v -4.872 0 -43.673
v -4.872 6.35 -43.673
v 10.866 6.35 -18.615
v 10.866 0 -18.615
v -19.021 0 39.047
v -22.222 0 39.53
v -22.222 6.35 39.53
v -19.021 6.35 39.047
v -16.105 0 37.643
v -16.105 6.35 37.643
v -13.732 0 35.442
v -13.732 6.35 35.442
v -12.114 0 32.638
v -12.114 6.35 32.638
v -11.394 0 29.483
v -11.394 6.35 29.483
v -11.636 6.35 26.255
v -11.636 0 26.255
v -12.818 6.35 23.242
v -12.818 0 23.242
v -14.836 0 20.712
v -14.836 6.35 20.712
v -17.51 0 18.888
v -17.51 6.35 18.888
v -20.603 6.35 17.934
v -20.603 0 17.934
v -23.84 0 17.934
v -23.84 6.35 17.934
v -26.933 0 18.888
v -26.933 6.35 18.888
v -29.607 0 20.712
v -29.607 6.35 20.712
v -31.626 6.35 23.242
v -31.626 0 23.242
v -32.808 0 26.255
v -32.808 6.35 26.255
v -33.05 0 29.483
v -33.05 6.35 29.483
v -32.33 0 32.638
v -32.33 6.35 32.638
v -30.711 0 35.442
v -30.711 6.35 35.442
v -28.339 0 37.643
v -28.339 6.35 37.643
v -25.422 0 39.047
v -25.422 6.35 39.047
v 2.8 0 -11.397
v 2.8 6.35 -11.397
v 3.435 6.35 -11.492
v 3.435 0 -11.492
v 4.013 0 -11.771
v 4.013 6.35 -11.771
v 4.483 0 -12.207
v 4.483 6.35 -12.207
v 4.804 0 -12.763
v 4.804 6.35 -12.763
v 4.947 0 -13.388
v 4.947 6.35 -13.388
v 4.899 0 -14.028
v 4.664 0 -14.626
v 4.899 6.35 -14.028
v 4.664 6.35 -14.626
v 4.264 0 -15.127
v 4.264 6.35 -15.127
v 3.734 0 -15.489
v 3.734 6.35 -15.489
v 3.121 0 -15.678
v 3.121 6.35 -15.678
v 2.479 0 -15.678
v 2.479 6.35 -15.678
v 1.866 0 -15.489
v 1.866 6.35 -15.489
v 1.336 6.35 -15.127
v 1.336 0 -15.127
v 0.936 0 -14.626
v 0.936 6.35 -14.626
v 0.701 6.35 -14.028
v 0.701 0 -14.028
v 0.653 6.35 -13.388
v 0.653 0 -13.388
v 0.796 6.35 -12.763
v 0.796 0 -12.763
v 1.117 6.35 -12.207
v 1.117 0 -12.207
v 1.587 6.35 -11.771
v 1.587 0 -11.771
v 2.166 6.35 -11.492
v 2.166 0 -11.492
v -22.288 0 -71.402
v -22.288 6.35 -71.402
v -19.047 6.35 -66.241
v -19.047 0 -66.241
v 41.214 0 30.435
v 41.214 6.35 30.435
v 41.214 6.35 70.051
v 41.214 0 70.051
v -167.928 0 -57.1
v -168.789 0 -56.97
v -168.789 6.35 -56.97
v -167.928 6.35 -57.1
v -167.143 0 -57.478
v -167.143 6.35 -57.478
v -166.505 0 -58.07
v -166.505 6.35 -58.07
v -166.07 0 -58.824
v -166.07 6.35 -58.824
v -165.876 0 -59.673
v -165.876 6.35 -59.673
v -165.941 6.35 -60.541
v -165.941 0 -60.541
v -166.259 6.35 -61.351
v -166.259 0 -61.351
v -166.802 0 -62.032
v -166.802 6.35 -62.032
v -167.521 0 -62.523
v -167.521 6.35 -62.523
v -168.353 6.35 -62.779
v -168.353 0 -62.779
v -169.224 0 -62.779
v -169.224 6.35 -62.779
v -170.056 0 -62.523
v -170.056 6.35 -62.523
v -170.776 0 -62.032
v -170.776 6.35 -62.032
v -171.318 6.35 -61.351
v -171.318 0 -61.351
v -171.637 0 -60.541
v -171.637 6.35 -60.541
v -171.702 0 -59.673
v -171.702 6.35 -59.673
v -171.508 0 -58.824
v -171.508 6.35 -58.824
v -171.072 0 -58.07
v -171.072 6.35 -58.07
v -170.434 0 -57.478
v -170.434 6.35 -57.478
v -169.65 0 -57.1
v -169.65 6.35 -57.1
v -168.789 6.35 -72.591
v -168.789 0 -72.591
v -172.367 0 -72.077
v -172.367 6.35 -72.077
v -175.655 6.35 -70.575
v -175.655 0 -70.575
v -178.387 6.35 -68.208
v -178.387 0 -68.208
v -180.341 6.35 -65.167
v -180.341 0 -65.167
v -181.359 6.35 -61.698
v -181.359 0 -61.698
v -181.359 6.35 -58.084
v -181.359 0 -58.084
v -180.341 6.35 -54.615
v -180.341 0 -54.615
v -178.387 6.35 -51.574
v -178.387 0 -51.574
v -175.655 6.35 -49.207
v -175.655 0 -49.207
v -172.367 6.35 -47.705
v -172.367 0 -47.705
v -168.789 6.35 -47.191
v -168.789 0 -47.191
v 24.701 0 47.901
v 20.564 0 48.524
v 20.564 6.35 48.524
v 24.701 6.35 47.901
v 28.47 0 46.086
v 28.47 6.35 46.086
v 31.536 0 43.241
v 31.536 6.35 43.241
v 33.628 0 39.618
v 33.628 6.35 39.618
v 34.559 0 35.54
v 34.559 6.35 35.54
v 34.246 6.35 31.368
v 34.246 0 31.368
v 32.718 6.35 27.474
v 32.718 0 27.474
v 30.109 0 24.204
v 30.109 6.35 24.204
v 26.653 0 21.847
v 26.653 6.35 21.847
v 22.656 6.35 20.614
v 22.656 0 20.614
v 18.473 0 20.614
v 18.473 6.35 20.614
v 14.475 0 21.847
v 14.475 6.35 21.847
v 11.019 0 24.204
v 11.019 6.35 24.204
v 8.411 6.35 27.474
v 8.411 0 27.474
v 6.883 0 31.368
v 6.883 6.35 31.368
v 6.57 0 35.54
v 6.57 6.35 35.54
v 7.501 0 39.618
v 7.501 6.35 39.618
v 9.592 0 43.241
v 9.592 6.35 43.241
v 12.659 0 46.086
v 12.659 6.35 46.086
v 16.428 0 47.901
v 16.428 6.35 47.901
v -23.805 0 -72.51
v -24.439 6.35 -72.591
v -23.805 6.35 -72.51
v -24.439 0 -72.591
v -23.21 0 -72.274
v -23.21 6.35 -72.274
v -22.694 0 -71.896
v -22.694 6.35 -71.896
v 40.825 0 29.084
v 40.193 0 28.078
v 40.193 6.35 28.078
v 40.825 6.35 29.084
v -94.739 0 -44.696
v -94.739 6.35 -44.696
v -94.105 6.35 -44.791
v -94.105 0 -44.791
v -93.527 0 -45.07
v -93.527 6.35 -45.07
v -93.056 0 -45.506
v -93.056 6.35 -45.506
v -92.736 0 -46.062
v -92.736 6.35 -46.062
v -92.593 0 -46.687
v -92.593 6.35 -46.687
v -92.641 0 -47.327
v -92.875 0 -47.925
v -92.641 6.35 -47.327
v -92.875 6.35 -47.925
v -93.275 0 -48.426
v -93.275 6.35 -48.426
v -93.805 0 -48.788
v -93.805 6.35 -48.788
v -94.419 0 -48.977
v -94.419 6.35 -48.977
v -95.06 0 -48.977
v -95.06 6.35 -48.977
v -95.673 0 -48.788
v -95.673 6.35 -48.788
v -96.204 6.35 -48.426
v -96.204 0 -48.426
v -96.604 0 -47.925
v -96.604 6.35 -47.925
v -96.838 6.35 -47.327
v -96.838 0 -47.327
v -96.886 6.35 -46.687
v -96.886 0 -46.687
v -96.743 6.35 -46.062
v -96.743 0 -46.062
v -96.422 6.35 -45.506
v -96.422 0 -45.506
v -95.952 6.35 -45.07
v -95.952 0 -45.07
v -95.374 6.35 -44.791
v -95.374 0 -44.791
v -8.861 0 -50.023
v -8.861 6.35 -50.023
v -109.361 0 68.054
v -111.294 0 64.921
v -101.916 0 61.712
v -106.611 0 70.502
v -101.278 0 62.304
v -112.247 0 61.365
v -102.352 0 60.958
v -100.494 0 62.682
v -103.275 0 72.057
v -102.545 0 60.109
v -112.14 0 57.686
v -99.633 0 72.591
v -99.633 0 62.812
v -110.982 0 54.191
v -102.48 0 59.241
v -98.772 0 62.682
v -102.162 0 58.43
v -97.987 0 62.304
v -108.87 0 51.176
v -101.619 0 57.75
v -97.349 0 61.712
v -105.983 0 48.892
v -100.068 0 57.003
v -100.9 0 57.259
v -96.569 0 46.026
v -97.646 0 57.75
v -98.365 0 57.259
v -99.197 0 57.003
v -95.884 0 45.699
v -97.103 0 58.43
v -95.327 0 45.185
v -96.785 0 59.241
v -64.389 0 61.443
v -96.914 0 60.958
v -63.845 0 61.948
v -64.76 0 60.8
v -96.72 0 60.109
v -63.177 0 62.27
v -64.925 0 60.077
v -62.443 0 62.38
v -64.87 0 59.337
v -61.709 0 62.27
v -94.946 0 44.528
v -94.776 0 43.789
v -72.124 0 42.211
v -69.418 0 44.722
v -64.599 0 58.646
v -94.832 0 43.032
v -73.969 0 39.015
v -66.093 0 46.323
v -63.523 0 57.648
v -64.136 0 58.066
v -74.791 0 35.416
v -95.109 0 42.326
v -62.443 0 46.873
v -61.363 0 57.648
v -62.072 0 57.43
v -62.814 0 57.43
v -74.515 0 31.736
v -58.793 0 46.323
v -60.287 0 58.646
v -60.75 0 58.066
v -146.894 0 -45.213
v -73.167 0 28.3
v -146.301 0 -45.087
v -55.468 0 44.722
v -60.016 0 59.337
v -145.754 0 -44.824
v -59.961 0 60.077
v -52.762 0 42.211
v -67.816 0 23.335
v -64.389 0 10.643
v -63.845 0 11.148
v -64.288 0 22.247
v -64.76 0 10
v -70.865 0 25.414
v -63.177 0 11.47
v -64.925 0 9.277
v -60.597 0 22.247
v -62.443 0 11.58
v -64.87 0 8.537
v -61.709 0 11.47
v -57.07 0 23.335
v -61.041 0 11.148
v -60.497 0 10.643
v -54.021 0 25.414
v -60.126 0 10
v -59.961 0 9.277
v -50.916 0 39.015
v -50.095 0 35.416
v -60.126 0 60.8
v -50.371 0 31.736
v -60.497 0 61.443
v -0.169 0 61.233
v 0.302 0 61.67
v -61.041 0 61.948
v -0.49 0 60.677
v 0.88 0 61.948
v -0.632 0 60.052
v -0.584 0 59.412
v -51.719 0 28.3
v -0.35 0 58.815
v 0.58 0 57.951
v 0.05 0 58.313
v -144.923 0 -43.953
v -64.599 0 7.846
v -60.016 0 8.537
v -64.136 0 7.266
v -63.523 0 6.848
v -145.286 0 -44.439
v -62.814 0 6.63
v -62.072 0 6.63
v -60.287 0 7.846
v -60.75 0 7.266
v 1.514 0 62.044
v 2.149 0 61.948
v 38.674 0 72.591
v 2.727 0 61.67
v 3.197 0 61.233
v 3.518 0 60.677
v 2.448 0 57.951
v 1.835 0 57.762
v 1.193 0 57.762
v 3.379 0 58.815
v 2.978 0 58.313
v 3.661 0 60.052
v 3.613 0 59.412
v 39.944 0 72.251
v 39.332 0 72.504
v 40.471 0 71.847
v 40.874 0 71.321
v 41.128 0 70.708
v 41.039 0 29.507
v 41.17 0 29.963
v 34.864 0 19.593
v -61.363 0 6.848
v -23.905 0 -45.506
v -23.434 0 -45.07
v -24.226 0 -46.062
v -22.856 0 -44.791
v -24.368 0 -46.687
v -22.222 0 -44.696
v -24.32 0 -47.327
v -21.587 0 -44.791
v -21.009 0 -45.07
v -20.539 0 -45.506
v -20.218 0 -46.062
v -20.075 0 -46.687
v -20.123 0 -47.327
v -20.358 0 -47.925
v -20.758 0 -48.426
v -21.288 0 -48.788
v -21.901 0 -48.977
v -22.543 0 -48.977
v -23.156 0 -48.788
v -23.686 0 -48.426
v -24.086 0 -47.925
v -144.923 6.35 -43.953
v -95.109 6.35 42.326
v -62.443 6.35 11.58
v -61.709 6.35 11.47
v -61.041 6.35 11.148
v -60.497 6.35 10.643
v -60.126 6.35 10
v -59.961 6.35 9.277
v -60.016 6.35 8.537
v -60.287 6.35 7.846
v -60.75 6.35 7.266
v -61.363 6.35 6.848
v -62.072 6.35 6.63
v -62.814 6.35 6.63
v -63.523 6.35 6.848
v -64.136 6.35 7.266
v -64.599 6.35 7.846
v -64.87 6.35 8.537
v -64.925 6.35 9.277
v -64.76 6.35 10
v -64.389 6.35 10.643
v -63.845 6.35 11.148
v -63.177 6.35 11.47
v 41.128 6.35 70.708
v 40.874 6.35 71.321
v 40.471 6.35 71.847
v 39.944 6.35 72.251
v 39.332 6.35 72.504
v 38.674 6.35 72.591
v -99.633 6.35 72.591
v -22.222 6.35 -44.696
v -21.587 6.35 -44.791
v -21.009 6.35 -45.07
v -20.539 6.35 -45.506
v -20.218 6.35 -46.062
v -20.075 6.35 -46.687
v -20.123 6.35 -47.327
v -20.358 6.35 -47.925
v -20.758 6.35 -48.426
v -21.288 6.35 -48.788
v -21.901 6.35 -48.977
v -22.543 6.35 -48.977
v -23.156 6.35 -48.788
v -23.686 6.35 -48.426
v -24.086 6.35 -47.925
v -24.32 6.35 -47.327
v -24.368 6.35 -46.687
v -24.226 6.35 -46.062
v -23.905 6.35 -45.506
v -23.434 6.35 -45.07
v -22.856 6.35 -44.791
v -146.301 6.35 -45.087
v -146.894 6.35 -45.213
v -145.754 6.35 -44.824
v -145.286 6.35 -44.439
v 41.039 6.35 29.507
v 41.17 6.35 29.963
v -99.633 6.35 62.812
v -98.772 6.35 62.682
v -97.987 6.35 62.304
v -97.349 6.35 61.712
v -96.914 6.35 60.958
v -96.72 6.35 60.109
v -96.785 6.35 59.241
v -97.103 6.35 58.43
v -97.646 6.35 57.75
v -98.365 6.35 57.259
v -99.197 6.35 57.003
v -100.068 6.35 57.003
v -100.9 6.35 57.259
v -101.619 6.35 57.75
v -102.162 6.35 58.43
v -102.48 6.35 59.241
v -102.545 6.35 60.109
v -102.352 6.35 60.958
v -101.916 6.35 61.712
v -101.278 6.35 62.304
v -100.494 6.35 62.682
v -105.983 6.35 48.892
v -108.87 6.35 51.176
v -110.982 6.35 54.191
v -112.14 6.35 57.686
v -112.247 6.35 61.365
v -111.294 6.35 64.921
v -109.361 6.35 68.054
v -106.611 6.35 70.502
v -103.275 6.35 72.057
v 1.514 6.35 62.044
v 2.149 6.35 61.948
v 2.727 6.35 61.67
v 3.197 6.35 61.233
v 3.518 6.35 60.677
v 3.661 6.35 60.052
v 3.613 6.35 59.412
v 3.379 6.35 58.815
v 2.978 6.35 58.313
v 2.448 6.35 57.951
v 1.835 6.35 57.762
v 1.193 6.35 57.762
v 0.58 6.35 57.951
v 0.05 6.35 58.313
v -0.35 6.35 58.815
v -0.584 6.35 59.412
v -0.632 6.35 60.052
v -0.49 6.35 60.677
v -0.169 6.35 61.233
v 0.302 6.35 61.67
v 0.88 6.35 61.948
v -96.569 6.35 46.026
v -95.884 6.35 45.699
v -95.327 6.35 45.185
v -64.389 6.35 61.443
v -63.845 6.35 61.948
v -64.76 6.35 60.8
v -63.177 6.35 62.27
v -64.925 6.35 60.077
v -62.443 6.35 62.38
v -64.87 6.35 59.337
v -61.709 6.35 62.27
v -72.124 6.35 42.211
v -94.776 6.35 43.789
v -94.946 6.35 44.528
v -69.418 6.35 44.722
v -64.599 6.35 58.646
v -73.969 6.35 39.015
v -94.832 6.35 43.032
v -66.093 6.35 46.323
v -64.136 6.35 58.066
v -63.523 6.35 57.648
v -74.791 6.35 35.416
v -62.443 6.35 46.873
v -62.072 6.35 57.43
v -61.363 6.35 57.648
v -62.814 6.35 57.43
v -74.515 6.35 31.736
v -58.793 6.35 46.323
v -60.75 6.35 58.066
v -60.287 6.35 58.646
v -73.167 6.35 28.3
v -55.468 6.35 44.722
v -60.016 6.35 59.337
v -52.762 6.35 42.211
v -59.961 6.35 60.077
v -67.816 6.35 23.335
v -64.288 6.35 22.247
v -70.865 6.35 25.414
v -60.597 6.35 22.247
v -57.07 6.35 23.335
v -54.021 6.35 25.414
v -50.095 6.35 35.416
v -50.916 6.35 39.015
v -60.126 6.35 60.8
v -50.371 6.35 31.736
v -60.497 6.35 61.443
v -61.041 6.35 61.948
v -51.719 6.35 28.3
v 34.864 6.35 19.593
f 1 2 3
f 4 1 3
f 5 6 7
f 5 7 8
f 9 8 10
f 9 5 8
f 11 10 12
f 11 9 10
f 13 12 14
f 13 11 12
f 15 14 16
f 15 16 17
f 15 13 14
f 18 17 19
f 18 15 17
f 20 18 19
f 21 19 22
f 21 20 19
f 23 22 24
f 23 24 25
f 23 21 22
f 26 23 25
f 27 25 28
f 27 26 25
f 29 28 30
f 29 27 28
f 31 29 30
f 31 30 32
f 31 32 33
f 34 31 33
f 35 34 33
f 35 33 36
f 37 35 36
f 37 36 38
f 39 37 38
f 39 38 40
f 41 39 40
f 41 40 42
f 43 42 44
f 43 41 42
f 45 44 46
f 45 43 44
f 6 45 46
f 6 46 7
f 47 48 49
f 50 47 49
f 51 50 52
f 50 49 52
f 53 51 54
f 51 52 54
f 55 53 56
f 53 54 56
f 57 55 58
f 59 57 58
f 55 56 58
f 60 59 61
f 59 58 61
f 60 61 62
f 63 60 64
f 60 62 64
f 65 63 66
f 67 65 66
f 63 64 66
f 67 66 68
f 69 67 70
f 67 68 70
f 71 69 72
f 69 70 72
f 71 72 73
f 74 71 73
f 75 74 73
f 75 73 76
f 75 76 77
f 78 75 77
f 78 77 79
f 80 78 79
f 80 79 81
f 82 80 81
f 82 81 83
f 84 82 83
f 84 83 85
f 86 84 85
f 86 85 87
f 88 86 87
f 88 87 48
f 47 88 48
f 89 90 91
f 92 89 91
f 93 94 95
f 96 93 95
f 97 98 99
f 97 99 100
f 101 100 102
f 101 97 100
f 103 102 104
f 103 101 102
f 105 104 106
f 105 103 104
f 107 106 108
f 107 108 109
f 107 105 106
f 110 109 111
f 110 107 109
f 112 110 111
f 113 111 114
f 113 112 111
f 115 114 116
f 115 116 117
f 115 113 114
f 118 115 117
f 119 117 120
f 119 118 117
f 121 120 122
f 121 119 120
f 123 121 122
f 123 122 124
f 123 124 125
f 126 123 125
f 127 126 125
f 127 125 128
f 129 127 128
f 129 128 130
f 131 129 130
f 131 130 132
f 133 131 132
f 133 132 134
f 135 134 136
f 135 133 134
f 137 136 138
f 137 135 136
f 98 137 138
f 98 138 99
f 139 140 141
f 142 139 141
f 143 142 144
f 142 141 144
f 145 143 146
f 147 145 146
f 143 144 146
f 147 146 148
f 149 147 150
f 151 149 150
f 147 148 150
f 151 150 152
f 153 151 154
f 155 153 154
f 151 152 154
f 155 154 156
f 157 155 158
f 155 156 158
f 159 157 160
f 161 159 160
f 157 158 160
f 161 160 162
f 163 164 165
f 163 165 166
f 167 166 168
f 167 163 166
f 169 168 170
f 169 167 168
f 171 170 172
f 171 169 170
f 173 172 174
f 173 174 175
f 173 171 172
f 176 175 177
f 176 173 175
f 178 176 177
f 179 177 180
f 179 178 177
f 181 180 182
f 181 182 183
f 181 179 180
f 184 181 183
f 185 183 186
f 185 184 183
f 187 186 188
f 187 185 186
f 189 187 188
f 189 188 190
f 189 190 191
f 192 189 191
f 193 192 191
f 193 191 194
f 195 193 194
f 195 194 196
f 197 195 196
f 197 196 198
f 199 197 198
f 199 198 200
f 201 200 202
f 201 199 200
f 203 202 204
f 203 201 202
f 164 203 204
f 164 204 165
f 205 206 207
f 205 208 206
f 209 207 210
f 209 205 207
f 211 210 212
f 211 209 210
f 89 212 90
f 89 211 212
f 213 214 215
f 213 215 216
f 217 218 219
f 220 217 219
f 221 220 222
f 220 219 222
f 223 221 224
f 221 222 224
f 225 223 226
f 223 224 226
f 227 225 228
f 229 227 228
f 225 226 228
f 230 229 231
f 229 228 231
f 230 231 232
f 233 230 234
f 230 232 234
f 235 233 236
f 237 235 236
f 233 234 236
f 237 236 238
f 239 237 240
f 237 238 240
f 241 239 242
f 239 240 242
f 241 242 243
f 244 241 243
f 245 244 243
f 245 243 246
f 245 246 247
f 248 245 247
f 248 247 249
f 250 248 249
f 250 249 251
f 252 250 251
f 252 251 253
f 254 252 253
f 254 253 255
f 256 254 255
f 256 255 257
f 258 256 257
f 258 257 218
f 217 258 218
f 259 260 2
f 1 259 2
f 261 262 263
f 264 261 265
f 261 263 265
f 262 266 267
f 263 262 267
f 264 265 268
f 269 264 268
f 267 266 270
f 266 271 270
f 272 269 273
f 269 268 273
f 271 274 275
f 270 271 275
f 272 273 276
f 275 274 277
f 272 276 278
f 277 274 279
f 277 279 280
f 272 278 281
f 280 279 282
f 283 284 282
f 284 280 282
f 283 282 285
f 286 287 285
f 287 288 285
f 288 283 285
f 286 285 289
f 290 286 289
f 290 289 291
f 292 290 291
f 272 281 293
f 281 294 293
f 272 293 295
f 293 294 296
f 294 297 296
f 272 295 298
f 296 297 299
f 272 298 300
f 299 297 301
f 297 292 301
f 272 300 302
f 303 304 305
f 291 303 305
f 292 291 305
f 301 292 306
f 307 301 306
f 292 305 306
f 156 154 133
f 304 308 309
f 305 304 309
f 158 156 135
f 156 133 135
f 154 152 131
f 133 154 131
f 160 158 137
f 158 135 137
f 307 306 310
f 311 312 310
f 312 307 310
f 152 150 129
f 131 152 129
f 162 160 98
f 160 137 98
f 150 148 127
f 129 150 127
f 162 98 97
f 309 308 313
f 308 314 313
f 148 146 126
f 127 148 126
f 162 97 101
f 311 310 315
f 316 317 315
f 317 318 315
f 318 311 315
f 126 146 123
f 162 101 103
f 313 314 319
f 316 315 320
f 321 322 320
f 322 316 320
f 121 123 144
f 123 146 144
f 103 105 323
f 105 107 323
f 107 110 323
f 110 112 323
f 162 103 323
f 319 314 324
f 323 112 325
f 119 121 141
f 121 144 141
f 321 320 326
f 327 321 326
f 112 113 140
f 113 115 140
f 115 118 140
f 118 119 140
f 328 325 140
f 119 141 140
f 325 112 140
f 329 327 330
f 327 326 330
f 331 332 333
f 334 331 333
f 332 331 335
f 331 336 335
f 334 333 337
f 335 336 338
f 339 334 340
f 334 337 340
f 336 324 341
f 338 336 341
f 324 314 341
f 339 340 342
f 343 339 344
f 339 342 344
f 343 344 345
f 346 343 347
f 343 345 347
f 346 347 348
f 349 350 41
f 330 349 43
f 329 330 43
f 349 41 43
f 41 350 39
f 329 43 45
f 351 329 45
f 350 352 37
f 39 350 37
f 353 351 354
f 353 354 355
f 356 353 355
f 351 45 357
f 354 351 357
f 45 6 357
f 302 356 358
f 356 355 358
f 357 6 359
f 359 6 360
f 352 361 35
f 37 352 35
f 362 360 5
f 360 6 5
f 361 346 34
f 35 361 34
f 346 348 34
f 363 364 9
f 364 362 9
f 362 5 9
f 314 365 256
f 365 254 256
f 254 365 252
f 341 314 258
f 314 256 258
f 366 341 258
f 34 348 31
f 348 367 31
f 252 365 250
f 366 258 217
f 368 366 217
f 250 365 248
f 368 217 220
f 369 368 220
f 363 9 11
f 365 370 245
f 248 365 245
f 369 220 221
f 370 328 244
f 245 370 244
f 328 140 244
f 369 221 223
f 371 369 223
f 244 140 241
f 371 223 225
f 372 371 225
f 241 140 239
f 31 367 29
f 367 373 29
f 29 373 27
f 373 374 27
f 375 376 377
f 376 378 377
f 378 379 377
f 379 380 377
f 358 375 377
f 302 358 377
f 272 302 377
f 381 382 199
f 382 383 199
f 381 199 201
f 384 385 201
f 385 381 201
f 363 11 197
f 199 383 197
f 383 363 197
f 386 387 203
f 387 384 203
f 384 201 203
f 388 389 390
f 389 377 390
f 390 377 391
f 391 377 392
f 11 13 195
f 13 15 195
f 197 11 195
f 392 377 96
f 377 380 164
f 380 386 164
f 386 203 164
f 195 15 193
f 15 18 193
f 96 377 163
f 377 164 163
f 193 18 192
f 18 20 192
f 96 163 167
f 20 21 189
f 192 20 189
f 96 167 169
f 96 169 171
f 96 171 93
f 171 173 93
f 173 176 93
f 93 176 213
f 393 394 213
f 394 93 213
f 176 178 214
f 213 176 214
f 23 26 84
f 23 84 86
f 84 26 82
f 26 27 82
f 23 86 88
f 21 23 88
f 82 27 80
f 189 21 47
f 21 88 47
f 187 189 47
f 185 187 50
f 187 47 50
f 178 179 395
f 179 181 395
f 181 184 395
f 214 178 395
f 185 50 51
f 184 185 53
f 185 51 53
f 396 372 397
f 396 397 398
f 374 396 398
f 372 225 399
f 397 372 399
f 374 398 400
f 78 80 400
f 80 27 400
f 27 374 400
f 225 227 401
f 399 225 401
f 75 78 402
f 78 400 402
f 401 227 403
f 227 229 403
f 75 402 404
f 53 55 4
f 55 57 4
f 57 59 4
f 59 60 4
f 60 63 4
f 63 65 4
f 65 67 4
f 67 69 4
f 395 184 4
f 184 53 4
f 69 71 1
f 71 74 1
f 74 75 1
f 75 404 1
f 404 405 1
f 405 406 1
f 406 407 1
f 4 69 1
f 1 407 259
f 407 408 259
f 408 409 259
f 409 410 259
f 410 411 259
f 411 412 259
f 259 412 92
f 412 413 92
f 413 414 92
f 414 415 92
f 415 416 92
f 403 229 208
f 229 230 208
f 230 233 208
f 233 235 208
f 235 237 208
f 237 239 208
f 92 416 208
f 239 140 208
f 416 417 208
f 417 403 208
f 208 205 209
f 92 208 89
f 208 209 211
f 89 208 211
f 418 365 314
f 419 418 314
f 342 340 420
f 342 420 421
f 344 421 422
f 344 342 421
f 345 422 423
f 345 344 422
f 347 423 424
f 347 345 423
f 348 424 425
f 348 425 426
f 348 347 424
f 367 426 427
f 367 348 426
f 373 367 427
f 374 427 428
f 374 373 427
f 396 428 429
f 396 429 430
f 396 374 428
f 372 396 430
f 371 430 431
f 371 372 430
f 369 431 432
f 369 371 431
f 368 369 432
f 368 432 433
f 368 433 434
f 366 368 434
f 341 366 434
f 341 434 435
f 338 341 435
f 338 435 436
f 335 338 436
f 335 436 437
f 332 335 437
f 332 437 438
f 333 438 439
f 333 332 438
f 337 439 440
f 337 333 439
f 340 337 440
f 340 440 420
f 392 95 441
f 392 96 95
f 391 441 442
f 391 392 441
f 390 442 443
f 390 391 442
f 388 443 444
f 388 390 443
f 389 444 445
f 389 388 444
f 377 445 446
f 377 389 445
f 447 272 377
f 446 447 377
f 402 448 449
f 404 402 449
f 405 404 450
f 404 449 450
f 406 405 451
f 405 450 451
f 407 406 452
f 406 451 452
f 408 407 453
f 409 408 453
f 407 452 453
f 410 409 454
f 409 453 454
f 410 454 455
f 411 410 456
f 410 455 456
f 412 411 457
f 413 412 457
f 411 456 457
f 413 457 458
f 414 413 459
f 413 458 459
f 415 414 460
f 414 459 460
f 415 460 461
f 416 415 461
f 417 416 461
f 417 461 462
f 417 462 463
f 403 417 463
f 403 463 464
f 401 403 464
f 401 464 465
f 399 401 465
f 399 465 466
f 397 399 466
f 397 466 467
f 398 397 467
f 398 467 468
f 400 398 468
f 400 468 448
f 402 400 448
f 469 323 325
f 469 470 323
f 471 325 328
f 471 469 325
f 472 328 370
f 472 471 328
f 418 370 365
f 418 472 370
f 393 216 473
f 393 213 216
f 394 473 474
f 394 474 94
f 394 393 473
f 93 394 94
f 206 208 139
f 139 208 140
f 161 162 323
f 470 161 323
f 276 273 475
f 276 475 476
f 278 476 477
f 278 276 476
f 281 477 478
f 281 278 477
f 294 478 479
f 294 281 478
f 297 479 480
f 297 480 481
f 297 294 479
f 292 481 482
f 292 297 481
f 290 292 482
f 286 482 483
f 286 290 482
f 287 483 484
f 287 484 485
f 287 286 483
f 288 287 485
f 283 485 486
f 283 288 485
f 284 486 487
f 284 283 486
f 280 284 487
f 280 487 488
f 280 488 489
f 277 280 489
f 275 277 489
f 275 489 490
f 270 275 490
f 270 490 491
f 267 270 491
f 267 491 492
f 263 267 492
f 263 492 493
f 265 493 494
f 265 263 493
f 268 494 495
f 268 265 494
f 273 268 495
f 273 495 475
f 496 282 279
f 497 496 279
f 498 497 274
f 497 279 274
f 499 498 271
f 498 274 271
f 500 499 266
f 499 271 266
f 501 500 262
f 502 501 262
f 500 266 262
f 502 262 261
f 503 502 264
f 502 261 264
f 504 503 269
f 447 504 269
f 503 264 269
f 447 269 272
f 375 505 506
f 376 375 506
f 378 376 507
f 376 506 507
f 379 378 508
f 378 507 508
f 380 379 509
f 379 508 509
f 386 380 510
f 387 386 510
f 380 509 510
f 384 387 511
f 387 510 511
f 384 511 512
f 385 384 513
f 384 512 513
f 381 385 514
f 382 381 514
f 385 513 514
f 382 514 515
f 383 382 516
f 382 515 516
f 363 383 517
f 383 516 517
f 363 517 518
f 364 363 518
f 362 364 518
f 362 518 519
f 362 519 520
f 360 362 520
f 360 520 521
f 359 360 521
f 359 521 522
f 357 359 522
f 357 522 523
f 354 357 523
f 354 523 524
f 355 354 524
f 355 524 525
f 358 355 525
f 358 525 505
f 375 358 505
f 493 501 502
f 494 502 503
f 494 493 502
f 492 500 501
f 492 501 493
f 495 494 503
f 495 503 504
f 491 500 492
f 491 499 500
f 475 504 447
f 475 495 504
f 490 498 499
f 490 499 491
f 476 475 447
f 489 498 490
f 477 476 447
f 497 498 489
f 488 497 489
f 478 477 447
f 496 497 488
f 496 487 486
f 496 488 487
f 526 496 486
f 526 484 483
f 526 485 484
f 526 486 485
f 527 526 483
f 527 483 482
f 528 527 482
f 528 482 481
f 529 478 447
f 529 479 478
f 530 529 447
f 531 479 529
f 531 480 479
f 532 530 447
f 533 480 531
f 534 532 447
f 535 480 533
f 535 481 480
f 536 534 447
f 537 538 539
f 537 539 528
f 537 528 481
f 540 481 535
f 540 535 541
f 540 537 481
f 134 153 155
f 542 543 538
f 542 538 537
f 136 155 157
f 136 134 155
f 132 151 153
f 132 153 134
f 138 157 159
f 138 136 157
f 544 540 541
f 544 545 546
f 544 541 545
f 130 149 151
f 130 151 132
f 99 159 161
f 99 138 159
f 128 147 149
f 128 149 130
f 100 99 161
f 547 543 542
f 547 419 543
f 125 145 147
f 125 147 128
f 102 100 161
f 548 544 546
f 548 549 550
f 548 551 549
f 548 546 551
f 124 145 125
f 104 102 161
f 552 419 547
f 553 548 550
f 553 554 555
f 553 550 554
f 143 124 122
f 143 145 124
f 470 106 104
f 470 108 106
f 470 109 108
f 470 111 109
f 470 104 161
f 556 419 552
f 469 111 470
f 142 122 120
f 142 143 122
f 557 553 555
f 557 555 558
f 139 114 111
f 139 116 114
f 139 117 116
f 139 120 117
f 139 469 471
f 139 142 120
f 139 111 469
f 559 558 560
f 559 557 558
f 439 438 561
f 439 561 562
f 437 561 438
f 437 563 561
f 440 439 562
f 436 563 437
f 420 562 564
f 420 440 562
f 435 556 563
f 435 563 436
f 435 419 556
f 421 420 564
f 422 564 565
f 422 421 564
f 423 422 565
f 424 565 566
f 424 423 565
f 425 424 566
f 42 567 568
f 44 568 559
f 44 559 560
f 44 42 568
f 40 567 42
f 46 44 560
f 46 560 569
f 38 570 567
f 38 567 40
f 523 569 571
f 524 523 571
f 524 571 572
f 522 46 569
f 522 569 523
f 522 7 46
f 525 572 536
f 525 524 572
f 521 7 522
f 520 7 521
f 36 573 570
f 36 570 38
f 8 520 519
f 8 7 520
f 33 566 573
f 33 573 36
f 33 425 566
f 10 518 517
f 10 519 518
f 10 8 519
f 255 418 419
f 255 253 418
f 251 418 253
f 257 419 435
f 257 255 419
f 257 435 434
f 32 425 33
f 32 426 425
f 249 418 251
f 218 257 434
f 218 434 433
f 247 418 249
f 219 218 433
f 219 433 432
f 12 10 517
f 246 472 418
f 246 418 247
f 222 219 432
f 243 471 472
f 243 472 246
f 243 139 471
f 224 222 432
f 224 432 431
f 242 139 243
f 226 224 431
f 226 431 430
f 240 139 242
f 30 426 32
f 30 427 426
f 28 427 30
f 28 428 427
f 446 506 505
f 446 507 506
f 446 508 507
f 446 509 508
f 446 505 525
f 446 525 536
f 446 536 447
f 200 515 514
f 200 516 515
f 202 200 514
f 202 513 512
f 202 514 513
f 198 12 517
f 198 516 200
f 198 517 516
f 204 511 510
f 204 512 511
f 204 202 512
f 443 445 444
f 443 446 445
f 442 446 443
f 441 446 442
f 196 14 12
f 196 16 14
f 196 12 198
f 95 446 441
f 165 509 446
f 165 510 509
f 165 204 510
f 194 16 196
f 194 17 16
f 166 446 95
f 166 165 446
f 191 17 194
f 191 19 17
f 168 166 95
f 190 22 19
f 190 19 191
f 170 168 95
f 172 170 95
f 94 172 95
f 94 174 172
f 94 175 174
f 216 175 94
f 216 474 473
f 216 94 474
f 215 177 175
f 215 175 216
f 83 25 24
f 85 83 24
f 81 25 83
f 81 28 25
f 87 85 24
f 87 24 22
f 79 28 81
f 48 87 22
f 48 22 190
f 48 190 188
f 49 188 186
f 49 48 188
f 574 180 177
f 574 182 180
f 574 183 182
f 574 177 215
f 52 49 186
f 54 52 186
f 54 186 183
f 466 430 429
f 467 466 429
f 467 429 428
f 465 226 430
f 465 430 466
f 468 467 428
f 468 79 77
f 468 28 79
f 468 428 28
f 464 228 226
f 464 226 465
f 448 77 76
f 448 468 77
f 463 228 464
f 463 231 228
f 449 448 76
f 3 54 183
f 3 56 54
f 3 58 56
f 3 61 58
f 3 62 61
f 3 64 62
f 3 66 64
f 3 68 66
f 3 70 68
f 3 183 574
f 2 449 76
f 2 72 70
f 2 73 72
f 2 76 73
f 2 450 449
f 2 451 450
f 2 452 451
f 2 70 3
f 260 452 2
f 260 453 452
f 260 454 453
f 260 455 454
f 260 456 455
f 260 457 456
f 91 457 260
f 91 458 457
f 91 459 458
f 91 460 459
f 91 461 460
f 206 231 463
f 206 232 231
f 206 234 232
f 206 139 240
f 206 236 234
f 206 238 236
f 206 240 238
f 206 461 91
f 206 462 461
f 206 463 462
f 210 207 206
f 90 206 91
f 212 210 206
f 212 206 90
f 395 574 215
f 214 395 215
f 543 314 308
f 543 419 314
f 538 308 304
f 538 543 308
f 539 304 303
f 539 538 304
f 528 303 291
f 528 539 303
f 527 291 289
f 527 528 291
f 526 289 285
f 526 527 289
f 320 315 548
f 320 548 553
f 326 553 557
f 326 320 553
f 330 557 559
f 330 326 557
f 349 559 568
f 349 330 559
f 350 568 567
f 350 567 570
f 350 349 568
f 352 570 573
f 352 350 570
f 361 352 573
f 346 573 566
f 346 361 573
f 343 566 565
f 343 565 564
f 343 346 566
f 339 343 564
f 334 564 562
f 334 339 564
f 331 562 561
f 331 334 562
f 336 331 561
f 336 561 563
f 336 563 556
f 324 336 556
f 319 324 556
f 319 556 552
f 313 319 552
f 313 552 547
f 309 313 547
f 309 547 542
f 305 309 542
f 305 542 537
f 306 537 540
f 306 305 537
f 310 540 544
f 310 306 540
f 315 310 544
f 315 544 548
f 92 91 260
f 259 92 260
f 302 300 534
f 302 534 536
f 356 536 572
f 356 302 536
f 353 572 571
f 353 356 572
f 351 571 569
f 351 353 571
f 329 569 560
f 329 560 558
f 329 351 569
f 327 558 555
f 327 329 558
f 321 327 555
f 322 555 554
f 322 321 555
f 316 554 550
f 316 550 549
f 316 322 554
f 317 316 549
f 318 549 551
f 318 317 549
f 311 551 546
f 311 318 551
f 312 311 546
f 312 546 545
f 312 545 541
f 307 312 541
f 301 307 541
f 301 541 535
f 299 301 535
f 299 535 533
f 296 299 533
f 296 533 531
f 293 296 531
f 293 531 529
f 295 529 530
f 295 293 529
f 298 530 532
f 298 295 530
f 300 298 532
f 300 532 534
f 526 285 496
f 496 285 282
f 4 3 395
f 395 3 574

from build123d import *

# Parameters (mm, degrees)
SKETCH1_R           = 2.921
SKETCH1_R_2         = 14.0335
SKETCH1_R_3         = 10.8585
SKETCH1_R_4         = 2.4892
SKETCH1_R_5         = 12.3825
BOSS_EXTRUDE1_DEPTH = 6.35
SKETCH2_W           = 6.35
SKETCH2_H           = 6.35
SKETCH2_H_2         = 16.217729686
SKETCH2_R           = 2.15265
CUT_EXTRUDE2_DEPTH  = 196.570791382
FILLET1_R           = 2.54


with BuildPart() as part:
    # Sketch1 → Boss-Extrude1 (new body)
    with BuildSketch(Plane(origin=(0, 0, 0), x_dir=(1, 0, 0), z_dir=(0, 1, 0))):
        with BuildLine():
            ThreePointArc((-168.788743889, 72.590962133), (-181.488743889, 59.890962122), (-168.788743866, 47.190962133))
            Line((-168.788743866, 47.190962133), (-145.58139547, 45.094655563))
            Line((-145.58139547, 45.094655563), (-93.510572414, -45.094655563))
            Line((-93.510572414, -45.094655563), (-105.98261767, -48.892439505))
            ThreePointArc((-105.98261767, -48.892439505), (-111.899875664, -63.177964006), (-99.63261767, -72.590962133))
            Line((-99.63261767, -72.590962133), (47.56445351, -72.590962133))
            Line((47.56445351, -72.590962133), (47.56445351, 72.590962133))
            Line((47.56445351, 72.590962133), (-168.788743889, 72.590962133))
        make_face()
        with Locations(Location((-168.788743889, 59.890962133, 0), (0, 0, 270))):
            Circle(SKETCH1_R, mode=Mode.SUBTRACT)
        with Locations(Location((20.56425351, -34.490962133, 0), (0, 0, 270))):
            Circle(SKETCH1_R_2, mode=Mode.SUBTRACT)
        with Locations(Location((-22.22178223, -28.671379192, 0), (0, 0, 270))):
            Circle(SKETCH1_R_3, mode=Mode.SUBTRACT)
        with Locations(Location((-62.44294649, -9.090962133, 0), (0, 0, 270))):
            Circle(SKETCH1_R_4, mode=Mode.SUBTRACT)
        with Locations(Location((-62.44294649, -34.490962133, 0), (0, 0, 270))):
            Circle(SKETCH1_R_5, mode=Mode.SUBTRACT)
        with Locations(Location((-62.44294649, -59.890962133, 0), (0, 0, 270))):
            Circle(SKETCH1_R_4, mode=Mode.SUBTRACT)
        with Locations(Location((-99.63261767, -59.890962133, 0), (0, 0, 270))):
            Circle(SKETCH1_R, mode=Mode.SUBTRACT)
    extrude(amount=BOSS_EXTRUDE1_DEPTH)

    # Sketch2 → Cut-Extrude2 (cut, through all)
    with BuildSketch(Plane(origin=(0, 6.35, 0), x_dir=(1, 0, 0), z_dir=(0, 1, 0))):
        Polygon((47.56445351, 66.240962133), (41.21445351, 66.240962133), (41.21445351, 50.023232447), (41.21445351, 43.673232447), (41.21445351, -29.703590933), (47.56445351, -39.813704084), align=None)
        with Locations((44.38945351, 69.415962133)):
            Rectangle(SKETCH2_W, SKETCH2_H)
        with Locations((38.03945351, 58.13209729)):
            Rectangle(SKETCH2_W, SKETCH2_H_2)
        with Locations((38.03945351, 69.415962133)):
            Rectangle(SKETCH2_W, SKETCH2_H)
        Polygon((34.86445351, 72.590962133), (-23.035115437, 72.590962133), (-19.04678223, 66.240962133), (34.86445351, 66.240962133), align=None)
        Polygon((34.86445351, 66.240962133), (-19.04678223, 66.240962133), (-8.860686193, 50.023232447), (34.86445351, 50.023232447), align=None)
        Polygon((34.86445351, 50.023232447), (-8.860686193, 50.023232447), (-4.872352987, 43.673232447), (34.86445351, 43.673232447), align=None)
        with Locations((38.03945351, 46.848232447)):
            Rectangle(SKETCH2_W, SKETCH2_H)
        Polygon((34.86445351, 43.673232447), (-4.872352987, 43.673232447), (10.866061277, 18.615413703), (34.86445351, -19.593477782), align=None)
        with BuildLine():
            Line((41.21445351, 43.673232447), (34.86445351, 43.673232447))
            Line((34.86445351, 43.673232447), (34.86445351, -19.593477782))
            ThreePointArc((34.86445351, -19.593477782), (38.05130715, -23.507624068), (40.193418442, -28.077956276))
            Line((40.193418442, -28.077956276), (41.21445351, -29.703590933))
            Line((41.21445351, -29.703590933), (41.21445351, 43.673232447))
        make_face()
        Polygon((47.56445351, -72.590962133), (47.56445351, -39.813704084), (41.21445351, -29.703590933), (41.21445351, -34.490962133), (41.21445351, -66.240962133), (41.21445351, -72.590962133), align=None)
        with Locations(Location((-94.739455539, 46.848232447, 0), (0, 0, 270))):
            Circle(SKETCH2_R)
        with Locations(Location((-22.22178223, 46.848232447, 0), (0, 0, 270))):
            Circle(SKETCH2_R)
        with Locations(Location((2.800077171, 13.549298288, 0), (0, 0, 270))):
            Circle(SKETCH2_R)
        with Locations(Location((1.51425351, -59.890962133, 0), (0, 0, 270))):
            Circle(SKETCH2_R)
        with BuildLine():
            ThreePointArc((40.193418442, -28.077956276), (38.05130715, -23.507624068), (34.86445351, -19.593477782))
            Line((34.86445351, -19.593477782), (40.193418442, -28.077956276))
        make_face()
    extrude(amount=-CUT_EXTRUDE2_DEPTH, mode=Mode.SUBTRACT)

    # Fillet1
    fillet1_edges = [part.edges().sort_by_distance(p)[0] for p in [
        (-93.510572414, 3.175, 45.094655563),
        (-145.58139547, 3.175, -45.094655563),
        (-23.035115437, 3.175, -72.590962133),
        (41.21445351, 3.175, 72.590962133),
        (41.21445351, 3.175, 29.703590933),
    ]]
    fillet(fillet1_edges, radius=FILLET1_R)


solid = part.part
